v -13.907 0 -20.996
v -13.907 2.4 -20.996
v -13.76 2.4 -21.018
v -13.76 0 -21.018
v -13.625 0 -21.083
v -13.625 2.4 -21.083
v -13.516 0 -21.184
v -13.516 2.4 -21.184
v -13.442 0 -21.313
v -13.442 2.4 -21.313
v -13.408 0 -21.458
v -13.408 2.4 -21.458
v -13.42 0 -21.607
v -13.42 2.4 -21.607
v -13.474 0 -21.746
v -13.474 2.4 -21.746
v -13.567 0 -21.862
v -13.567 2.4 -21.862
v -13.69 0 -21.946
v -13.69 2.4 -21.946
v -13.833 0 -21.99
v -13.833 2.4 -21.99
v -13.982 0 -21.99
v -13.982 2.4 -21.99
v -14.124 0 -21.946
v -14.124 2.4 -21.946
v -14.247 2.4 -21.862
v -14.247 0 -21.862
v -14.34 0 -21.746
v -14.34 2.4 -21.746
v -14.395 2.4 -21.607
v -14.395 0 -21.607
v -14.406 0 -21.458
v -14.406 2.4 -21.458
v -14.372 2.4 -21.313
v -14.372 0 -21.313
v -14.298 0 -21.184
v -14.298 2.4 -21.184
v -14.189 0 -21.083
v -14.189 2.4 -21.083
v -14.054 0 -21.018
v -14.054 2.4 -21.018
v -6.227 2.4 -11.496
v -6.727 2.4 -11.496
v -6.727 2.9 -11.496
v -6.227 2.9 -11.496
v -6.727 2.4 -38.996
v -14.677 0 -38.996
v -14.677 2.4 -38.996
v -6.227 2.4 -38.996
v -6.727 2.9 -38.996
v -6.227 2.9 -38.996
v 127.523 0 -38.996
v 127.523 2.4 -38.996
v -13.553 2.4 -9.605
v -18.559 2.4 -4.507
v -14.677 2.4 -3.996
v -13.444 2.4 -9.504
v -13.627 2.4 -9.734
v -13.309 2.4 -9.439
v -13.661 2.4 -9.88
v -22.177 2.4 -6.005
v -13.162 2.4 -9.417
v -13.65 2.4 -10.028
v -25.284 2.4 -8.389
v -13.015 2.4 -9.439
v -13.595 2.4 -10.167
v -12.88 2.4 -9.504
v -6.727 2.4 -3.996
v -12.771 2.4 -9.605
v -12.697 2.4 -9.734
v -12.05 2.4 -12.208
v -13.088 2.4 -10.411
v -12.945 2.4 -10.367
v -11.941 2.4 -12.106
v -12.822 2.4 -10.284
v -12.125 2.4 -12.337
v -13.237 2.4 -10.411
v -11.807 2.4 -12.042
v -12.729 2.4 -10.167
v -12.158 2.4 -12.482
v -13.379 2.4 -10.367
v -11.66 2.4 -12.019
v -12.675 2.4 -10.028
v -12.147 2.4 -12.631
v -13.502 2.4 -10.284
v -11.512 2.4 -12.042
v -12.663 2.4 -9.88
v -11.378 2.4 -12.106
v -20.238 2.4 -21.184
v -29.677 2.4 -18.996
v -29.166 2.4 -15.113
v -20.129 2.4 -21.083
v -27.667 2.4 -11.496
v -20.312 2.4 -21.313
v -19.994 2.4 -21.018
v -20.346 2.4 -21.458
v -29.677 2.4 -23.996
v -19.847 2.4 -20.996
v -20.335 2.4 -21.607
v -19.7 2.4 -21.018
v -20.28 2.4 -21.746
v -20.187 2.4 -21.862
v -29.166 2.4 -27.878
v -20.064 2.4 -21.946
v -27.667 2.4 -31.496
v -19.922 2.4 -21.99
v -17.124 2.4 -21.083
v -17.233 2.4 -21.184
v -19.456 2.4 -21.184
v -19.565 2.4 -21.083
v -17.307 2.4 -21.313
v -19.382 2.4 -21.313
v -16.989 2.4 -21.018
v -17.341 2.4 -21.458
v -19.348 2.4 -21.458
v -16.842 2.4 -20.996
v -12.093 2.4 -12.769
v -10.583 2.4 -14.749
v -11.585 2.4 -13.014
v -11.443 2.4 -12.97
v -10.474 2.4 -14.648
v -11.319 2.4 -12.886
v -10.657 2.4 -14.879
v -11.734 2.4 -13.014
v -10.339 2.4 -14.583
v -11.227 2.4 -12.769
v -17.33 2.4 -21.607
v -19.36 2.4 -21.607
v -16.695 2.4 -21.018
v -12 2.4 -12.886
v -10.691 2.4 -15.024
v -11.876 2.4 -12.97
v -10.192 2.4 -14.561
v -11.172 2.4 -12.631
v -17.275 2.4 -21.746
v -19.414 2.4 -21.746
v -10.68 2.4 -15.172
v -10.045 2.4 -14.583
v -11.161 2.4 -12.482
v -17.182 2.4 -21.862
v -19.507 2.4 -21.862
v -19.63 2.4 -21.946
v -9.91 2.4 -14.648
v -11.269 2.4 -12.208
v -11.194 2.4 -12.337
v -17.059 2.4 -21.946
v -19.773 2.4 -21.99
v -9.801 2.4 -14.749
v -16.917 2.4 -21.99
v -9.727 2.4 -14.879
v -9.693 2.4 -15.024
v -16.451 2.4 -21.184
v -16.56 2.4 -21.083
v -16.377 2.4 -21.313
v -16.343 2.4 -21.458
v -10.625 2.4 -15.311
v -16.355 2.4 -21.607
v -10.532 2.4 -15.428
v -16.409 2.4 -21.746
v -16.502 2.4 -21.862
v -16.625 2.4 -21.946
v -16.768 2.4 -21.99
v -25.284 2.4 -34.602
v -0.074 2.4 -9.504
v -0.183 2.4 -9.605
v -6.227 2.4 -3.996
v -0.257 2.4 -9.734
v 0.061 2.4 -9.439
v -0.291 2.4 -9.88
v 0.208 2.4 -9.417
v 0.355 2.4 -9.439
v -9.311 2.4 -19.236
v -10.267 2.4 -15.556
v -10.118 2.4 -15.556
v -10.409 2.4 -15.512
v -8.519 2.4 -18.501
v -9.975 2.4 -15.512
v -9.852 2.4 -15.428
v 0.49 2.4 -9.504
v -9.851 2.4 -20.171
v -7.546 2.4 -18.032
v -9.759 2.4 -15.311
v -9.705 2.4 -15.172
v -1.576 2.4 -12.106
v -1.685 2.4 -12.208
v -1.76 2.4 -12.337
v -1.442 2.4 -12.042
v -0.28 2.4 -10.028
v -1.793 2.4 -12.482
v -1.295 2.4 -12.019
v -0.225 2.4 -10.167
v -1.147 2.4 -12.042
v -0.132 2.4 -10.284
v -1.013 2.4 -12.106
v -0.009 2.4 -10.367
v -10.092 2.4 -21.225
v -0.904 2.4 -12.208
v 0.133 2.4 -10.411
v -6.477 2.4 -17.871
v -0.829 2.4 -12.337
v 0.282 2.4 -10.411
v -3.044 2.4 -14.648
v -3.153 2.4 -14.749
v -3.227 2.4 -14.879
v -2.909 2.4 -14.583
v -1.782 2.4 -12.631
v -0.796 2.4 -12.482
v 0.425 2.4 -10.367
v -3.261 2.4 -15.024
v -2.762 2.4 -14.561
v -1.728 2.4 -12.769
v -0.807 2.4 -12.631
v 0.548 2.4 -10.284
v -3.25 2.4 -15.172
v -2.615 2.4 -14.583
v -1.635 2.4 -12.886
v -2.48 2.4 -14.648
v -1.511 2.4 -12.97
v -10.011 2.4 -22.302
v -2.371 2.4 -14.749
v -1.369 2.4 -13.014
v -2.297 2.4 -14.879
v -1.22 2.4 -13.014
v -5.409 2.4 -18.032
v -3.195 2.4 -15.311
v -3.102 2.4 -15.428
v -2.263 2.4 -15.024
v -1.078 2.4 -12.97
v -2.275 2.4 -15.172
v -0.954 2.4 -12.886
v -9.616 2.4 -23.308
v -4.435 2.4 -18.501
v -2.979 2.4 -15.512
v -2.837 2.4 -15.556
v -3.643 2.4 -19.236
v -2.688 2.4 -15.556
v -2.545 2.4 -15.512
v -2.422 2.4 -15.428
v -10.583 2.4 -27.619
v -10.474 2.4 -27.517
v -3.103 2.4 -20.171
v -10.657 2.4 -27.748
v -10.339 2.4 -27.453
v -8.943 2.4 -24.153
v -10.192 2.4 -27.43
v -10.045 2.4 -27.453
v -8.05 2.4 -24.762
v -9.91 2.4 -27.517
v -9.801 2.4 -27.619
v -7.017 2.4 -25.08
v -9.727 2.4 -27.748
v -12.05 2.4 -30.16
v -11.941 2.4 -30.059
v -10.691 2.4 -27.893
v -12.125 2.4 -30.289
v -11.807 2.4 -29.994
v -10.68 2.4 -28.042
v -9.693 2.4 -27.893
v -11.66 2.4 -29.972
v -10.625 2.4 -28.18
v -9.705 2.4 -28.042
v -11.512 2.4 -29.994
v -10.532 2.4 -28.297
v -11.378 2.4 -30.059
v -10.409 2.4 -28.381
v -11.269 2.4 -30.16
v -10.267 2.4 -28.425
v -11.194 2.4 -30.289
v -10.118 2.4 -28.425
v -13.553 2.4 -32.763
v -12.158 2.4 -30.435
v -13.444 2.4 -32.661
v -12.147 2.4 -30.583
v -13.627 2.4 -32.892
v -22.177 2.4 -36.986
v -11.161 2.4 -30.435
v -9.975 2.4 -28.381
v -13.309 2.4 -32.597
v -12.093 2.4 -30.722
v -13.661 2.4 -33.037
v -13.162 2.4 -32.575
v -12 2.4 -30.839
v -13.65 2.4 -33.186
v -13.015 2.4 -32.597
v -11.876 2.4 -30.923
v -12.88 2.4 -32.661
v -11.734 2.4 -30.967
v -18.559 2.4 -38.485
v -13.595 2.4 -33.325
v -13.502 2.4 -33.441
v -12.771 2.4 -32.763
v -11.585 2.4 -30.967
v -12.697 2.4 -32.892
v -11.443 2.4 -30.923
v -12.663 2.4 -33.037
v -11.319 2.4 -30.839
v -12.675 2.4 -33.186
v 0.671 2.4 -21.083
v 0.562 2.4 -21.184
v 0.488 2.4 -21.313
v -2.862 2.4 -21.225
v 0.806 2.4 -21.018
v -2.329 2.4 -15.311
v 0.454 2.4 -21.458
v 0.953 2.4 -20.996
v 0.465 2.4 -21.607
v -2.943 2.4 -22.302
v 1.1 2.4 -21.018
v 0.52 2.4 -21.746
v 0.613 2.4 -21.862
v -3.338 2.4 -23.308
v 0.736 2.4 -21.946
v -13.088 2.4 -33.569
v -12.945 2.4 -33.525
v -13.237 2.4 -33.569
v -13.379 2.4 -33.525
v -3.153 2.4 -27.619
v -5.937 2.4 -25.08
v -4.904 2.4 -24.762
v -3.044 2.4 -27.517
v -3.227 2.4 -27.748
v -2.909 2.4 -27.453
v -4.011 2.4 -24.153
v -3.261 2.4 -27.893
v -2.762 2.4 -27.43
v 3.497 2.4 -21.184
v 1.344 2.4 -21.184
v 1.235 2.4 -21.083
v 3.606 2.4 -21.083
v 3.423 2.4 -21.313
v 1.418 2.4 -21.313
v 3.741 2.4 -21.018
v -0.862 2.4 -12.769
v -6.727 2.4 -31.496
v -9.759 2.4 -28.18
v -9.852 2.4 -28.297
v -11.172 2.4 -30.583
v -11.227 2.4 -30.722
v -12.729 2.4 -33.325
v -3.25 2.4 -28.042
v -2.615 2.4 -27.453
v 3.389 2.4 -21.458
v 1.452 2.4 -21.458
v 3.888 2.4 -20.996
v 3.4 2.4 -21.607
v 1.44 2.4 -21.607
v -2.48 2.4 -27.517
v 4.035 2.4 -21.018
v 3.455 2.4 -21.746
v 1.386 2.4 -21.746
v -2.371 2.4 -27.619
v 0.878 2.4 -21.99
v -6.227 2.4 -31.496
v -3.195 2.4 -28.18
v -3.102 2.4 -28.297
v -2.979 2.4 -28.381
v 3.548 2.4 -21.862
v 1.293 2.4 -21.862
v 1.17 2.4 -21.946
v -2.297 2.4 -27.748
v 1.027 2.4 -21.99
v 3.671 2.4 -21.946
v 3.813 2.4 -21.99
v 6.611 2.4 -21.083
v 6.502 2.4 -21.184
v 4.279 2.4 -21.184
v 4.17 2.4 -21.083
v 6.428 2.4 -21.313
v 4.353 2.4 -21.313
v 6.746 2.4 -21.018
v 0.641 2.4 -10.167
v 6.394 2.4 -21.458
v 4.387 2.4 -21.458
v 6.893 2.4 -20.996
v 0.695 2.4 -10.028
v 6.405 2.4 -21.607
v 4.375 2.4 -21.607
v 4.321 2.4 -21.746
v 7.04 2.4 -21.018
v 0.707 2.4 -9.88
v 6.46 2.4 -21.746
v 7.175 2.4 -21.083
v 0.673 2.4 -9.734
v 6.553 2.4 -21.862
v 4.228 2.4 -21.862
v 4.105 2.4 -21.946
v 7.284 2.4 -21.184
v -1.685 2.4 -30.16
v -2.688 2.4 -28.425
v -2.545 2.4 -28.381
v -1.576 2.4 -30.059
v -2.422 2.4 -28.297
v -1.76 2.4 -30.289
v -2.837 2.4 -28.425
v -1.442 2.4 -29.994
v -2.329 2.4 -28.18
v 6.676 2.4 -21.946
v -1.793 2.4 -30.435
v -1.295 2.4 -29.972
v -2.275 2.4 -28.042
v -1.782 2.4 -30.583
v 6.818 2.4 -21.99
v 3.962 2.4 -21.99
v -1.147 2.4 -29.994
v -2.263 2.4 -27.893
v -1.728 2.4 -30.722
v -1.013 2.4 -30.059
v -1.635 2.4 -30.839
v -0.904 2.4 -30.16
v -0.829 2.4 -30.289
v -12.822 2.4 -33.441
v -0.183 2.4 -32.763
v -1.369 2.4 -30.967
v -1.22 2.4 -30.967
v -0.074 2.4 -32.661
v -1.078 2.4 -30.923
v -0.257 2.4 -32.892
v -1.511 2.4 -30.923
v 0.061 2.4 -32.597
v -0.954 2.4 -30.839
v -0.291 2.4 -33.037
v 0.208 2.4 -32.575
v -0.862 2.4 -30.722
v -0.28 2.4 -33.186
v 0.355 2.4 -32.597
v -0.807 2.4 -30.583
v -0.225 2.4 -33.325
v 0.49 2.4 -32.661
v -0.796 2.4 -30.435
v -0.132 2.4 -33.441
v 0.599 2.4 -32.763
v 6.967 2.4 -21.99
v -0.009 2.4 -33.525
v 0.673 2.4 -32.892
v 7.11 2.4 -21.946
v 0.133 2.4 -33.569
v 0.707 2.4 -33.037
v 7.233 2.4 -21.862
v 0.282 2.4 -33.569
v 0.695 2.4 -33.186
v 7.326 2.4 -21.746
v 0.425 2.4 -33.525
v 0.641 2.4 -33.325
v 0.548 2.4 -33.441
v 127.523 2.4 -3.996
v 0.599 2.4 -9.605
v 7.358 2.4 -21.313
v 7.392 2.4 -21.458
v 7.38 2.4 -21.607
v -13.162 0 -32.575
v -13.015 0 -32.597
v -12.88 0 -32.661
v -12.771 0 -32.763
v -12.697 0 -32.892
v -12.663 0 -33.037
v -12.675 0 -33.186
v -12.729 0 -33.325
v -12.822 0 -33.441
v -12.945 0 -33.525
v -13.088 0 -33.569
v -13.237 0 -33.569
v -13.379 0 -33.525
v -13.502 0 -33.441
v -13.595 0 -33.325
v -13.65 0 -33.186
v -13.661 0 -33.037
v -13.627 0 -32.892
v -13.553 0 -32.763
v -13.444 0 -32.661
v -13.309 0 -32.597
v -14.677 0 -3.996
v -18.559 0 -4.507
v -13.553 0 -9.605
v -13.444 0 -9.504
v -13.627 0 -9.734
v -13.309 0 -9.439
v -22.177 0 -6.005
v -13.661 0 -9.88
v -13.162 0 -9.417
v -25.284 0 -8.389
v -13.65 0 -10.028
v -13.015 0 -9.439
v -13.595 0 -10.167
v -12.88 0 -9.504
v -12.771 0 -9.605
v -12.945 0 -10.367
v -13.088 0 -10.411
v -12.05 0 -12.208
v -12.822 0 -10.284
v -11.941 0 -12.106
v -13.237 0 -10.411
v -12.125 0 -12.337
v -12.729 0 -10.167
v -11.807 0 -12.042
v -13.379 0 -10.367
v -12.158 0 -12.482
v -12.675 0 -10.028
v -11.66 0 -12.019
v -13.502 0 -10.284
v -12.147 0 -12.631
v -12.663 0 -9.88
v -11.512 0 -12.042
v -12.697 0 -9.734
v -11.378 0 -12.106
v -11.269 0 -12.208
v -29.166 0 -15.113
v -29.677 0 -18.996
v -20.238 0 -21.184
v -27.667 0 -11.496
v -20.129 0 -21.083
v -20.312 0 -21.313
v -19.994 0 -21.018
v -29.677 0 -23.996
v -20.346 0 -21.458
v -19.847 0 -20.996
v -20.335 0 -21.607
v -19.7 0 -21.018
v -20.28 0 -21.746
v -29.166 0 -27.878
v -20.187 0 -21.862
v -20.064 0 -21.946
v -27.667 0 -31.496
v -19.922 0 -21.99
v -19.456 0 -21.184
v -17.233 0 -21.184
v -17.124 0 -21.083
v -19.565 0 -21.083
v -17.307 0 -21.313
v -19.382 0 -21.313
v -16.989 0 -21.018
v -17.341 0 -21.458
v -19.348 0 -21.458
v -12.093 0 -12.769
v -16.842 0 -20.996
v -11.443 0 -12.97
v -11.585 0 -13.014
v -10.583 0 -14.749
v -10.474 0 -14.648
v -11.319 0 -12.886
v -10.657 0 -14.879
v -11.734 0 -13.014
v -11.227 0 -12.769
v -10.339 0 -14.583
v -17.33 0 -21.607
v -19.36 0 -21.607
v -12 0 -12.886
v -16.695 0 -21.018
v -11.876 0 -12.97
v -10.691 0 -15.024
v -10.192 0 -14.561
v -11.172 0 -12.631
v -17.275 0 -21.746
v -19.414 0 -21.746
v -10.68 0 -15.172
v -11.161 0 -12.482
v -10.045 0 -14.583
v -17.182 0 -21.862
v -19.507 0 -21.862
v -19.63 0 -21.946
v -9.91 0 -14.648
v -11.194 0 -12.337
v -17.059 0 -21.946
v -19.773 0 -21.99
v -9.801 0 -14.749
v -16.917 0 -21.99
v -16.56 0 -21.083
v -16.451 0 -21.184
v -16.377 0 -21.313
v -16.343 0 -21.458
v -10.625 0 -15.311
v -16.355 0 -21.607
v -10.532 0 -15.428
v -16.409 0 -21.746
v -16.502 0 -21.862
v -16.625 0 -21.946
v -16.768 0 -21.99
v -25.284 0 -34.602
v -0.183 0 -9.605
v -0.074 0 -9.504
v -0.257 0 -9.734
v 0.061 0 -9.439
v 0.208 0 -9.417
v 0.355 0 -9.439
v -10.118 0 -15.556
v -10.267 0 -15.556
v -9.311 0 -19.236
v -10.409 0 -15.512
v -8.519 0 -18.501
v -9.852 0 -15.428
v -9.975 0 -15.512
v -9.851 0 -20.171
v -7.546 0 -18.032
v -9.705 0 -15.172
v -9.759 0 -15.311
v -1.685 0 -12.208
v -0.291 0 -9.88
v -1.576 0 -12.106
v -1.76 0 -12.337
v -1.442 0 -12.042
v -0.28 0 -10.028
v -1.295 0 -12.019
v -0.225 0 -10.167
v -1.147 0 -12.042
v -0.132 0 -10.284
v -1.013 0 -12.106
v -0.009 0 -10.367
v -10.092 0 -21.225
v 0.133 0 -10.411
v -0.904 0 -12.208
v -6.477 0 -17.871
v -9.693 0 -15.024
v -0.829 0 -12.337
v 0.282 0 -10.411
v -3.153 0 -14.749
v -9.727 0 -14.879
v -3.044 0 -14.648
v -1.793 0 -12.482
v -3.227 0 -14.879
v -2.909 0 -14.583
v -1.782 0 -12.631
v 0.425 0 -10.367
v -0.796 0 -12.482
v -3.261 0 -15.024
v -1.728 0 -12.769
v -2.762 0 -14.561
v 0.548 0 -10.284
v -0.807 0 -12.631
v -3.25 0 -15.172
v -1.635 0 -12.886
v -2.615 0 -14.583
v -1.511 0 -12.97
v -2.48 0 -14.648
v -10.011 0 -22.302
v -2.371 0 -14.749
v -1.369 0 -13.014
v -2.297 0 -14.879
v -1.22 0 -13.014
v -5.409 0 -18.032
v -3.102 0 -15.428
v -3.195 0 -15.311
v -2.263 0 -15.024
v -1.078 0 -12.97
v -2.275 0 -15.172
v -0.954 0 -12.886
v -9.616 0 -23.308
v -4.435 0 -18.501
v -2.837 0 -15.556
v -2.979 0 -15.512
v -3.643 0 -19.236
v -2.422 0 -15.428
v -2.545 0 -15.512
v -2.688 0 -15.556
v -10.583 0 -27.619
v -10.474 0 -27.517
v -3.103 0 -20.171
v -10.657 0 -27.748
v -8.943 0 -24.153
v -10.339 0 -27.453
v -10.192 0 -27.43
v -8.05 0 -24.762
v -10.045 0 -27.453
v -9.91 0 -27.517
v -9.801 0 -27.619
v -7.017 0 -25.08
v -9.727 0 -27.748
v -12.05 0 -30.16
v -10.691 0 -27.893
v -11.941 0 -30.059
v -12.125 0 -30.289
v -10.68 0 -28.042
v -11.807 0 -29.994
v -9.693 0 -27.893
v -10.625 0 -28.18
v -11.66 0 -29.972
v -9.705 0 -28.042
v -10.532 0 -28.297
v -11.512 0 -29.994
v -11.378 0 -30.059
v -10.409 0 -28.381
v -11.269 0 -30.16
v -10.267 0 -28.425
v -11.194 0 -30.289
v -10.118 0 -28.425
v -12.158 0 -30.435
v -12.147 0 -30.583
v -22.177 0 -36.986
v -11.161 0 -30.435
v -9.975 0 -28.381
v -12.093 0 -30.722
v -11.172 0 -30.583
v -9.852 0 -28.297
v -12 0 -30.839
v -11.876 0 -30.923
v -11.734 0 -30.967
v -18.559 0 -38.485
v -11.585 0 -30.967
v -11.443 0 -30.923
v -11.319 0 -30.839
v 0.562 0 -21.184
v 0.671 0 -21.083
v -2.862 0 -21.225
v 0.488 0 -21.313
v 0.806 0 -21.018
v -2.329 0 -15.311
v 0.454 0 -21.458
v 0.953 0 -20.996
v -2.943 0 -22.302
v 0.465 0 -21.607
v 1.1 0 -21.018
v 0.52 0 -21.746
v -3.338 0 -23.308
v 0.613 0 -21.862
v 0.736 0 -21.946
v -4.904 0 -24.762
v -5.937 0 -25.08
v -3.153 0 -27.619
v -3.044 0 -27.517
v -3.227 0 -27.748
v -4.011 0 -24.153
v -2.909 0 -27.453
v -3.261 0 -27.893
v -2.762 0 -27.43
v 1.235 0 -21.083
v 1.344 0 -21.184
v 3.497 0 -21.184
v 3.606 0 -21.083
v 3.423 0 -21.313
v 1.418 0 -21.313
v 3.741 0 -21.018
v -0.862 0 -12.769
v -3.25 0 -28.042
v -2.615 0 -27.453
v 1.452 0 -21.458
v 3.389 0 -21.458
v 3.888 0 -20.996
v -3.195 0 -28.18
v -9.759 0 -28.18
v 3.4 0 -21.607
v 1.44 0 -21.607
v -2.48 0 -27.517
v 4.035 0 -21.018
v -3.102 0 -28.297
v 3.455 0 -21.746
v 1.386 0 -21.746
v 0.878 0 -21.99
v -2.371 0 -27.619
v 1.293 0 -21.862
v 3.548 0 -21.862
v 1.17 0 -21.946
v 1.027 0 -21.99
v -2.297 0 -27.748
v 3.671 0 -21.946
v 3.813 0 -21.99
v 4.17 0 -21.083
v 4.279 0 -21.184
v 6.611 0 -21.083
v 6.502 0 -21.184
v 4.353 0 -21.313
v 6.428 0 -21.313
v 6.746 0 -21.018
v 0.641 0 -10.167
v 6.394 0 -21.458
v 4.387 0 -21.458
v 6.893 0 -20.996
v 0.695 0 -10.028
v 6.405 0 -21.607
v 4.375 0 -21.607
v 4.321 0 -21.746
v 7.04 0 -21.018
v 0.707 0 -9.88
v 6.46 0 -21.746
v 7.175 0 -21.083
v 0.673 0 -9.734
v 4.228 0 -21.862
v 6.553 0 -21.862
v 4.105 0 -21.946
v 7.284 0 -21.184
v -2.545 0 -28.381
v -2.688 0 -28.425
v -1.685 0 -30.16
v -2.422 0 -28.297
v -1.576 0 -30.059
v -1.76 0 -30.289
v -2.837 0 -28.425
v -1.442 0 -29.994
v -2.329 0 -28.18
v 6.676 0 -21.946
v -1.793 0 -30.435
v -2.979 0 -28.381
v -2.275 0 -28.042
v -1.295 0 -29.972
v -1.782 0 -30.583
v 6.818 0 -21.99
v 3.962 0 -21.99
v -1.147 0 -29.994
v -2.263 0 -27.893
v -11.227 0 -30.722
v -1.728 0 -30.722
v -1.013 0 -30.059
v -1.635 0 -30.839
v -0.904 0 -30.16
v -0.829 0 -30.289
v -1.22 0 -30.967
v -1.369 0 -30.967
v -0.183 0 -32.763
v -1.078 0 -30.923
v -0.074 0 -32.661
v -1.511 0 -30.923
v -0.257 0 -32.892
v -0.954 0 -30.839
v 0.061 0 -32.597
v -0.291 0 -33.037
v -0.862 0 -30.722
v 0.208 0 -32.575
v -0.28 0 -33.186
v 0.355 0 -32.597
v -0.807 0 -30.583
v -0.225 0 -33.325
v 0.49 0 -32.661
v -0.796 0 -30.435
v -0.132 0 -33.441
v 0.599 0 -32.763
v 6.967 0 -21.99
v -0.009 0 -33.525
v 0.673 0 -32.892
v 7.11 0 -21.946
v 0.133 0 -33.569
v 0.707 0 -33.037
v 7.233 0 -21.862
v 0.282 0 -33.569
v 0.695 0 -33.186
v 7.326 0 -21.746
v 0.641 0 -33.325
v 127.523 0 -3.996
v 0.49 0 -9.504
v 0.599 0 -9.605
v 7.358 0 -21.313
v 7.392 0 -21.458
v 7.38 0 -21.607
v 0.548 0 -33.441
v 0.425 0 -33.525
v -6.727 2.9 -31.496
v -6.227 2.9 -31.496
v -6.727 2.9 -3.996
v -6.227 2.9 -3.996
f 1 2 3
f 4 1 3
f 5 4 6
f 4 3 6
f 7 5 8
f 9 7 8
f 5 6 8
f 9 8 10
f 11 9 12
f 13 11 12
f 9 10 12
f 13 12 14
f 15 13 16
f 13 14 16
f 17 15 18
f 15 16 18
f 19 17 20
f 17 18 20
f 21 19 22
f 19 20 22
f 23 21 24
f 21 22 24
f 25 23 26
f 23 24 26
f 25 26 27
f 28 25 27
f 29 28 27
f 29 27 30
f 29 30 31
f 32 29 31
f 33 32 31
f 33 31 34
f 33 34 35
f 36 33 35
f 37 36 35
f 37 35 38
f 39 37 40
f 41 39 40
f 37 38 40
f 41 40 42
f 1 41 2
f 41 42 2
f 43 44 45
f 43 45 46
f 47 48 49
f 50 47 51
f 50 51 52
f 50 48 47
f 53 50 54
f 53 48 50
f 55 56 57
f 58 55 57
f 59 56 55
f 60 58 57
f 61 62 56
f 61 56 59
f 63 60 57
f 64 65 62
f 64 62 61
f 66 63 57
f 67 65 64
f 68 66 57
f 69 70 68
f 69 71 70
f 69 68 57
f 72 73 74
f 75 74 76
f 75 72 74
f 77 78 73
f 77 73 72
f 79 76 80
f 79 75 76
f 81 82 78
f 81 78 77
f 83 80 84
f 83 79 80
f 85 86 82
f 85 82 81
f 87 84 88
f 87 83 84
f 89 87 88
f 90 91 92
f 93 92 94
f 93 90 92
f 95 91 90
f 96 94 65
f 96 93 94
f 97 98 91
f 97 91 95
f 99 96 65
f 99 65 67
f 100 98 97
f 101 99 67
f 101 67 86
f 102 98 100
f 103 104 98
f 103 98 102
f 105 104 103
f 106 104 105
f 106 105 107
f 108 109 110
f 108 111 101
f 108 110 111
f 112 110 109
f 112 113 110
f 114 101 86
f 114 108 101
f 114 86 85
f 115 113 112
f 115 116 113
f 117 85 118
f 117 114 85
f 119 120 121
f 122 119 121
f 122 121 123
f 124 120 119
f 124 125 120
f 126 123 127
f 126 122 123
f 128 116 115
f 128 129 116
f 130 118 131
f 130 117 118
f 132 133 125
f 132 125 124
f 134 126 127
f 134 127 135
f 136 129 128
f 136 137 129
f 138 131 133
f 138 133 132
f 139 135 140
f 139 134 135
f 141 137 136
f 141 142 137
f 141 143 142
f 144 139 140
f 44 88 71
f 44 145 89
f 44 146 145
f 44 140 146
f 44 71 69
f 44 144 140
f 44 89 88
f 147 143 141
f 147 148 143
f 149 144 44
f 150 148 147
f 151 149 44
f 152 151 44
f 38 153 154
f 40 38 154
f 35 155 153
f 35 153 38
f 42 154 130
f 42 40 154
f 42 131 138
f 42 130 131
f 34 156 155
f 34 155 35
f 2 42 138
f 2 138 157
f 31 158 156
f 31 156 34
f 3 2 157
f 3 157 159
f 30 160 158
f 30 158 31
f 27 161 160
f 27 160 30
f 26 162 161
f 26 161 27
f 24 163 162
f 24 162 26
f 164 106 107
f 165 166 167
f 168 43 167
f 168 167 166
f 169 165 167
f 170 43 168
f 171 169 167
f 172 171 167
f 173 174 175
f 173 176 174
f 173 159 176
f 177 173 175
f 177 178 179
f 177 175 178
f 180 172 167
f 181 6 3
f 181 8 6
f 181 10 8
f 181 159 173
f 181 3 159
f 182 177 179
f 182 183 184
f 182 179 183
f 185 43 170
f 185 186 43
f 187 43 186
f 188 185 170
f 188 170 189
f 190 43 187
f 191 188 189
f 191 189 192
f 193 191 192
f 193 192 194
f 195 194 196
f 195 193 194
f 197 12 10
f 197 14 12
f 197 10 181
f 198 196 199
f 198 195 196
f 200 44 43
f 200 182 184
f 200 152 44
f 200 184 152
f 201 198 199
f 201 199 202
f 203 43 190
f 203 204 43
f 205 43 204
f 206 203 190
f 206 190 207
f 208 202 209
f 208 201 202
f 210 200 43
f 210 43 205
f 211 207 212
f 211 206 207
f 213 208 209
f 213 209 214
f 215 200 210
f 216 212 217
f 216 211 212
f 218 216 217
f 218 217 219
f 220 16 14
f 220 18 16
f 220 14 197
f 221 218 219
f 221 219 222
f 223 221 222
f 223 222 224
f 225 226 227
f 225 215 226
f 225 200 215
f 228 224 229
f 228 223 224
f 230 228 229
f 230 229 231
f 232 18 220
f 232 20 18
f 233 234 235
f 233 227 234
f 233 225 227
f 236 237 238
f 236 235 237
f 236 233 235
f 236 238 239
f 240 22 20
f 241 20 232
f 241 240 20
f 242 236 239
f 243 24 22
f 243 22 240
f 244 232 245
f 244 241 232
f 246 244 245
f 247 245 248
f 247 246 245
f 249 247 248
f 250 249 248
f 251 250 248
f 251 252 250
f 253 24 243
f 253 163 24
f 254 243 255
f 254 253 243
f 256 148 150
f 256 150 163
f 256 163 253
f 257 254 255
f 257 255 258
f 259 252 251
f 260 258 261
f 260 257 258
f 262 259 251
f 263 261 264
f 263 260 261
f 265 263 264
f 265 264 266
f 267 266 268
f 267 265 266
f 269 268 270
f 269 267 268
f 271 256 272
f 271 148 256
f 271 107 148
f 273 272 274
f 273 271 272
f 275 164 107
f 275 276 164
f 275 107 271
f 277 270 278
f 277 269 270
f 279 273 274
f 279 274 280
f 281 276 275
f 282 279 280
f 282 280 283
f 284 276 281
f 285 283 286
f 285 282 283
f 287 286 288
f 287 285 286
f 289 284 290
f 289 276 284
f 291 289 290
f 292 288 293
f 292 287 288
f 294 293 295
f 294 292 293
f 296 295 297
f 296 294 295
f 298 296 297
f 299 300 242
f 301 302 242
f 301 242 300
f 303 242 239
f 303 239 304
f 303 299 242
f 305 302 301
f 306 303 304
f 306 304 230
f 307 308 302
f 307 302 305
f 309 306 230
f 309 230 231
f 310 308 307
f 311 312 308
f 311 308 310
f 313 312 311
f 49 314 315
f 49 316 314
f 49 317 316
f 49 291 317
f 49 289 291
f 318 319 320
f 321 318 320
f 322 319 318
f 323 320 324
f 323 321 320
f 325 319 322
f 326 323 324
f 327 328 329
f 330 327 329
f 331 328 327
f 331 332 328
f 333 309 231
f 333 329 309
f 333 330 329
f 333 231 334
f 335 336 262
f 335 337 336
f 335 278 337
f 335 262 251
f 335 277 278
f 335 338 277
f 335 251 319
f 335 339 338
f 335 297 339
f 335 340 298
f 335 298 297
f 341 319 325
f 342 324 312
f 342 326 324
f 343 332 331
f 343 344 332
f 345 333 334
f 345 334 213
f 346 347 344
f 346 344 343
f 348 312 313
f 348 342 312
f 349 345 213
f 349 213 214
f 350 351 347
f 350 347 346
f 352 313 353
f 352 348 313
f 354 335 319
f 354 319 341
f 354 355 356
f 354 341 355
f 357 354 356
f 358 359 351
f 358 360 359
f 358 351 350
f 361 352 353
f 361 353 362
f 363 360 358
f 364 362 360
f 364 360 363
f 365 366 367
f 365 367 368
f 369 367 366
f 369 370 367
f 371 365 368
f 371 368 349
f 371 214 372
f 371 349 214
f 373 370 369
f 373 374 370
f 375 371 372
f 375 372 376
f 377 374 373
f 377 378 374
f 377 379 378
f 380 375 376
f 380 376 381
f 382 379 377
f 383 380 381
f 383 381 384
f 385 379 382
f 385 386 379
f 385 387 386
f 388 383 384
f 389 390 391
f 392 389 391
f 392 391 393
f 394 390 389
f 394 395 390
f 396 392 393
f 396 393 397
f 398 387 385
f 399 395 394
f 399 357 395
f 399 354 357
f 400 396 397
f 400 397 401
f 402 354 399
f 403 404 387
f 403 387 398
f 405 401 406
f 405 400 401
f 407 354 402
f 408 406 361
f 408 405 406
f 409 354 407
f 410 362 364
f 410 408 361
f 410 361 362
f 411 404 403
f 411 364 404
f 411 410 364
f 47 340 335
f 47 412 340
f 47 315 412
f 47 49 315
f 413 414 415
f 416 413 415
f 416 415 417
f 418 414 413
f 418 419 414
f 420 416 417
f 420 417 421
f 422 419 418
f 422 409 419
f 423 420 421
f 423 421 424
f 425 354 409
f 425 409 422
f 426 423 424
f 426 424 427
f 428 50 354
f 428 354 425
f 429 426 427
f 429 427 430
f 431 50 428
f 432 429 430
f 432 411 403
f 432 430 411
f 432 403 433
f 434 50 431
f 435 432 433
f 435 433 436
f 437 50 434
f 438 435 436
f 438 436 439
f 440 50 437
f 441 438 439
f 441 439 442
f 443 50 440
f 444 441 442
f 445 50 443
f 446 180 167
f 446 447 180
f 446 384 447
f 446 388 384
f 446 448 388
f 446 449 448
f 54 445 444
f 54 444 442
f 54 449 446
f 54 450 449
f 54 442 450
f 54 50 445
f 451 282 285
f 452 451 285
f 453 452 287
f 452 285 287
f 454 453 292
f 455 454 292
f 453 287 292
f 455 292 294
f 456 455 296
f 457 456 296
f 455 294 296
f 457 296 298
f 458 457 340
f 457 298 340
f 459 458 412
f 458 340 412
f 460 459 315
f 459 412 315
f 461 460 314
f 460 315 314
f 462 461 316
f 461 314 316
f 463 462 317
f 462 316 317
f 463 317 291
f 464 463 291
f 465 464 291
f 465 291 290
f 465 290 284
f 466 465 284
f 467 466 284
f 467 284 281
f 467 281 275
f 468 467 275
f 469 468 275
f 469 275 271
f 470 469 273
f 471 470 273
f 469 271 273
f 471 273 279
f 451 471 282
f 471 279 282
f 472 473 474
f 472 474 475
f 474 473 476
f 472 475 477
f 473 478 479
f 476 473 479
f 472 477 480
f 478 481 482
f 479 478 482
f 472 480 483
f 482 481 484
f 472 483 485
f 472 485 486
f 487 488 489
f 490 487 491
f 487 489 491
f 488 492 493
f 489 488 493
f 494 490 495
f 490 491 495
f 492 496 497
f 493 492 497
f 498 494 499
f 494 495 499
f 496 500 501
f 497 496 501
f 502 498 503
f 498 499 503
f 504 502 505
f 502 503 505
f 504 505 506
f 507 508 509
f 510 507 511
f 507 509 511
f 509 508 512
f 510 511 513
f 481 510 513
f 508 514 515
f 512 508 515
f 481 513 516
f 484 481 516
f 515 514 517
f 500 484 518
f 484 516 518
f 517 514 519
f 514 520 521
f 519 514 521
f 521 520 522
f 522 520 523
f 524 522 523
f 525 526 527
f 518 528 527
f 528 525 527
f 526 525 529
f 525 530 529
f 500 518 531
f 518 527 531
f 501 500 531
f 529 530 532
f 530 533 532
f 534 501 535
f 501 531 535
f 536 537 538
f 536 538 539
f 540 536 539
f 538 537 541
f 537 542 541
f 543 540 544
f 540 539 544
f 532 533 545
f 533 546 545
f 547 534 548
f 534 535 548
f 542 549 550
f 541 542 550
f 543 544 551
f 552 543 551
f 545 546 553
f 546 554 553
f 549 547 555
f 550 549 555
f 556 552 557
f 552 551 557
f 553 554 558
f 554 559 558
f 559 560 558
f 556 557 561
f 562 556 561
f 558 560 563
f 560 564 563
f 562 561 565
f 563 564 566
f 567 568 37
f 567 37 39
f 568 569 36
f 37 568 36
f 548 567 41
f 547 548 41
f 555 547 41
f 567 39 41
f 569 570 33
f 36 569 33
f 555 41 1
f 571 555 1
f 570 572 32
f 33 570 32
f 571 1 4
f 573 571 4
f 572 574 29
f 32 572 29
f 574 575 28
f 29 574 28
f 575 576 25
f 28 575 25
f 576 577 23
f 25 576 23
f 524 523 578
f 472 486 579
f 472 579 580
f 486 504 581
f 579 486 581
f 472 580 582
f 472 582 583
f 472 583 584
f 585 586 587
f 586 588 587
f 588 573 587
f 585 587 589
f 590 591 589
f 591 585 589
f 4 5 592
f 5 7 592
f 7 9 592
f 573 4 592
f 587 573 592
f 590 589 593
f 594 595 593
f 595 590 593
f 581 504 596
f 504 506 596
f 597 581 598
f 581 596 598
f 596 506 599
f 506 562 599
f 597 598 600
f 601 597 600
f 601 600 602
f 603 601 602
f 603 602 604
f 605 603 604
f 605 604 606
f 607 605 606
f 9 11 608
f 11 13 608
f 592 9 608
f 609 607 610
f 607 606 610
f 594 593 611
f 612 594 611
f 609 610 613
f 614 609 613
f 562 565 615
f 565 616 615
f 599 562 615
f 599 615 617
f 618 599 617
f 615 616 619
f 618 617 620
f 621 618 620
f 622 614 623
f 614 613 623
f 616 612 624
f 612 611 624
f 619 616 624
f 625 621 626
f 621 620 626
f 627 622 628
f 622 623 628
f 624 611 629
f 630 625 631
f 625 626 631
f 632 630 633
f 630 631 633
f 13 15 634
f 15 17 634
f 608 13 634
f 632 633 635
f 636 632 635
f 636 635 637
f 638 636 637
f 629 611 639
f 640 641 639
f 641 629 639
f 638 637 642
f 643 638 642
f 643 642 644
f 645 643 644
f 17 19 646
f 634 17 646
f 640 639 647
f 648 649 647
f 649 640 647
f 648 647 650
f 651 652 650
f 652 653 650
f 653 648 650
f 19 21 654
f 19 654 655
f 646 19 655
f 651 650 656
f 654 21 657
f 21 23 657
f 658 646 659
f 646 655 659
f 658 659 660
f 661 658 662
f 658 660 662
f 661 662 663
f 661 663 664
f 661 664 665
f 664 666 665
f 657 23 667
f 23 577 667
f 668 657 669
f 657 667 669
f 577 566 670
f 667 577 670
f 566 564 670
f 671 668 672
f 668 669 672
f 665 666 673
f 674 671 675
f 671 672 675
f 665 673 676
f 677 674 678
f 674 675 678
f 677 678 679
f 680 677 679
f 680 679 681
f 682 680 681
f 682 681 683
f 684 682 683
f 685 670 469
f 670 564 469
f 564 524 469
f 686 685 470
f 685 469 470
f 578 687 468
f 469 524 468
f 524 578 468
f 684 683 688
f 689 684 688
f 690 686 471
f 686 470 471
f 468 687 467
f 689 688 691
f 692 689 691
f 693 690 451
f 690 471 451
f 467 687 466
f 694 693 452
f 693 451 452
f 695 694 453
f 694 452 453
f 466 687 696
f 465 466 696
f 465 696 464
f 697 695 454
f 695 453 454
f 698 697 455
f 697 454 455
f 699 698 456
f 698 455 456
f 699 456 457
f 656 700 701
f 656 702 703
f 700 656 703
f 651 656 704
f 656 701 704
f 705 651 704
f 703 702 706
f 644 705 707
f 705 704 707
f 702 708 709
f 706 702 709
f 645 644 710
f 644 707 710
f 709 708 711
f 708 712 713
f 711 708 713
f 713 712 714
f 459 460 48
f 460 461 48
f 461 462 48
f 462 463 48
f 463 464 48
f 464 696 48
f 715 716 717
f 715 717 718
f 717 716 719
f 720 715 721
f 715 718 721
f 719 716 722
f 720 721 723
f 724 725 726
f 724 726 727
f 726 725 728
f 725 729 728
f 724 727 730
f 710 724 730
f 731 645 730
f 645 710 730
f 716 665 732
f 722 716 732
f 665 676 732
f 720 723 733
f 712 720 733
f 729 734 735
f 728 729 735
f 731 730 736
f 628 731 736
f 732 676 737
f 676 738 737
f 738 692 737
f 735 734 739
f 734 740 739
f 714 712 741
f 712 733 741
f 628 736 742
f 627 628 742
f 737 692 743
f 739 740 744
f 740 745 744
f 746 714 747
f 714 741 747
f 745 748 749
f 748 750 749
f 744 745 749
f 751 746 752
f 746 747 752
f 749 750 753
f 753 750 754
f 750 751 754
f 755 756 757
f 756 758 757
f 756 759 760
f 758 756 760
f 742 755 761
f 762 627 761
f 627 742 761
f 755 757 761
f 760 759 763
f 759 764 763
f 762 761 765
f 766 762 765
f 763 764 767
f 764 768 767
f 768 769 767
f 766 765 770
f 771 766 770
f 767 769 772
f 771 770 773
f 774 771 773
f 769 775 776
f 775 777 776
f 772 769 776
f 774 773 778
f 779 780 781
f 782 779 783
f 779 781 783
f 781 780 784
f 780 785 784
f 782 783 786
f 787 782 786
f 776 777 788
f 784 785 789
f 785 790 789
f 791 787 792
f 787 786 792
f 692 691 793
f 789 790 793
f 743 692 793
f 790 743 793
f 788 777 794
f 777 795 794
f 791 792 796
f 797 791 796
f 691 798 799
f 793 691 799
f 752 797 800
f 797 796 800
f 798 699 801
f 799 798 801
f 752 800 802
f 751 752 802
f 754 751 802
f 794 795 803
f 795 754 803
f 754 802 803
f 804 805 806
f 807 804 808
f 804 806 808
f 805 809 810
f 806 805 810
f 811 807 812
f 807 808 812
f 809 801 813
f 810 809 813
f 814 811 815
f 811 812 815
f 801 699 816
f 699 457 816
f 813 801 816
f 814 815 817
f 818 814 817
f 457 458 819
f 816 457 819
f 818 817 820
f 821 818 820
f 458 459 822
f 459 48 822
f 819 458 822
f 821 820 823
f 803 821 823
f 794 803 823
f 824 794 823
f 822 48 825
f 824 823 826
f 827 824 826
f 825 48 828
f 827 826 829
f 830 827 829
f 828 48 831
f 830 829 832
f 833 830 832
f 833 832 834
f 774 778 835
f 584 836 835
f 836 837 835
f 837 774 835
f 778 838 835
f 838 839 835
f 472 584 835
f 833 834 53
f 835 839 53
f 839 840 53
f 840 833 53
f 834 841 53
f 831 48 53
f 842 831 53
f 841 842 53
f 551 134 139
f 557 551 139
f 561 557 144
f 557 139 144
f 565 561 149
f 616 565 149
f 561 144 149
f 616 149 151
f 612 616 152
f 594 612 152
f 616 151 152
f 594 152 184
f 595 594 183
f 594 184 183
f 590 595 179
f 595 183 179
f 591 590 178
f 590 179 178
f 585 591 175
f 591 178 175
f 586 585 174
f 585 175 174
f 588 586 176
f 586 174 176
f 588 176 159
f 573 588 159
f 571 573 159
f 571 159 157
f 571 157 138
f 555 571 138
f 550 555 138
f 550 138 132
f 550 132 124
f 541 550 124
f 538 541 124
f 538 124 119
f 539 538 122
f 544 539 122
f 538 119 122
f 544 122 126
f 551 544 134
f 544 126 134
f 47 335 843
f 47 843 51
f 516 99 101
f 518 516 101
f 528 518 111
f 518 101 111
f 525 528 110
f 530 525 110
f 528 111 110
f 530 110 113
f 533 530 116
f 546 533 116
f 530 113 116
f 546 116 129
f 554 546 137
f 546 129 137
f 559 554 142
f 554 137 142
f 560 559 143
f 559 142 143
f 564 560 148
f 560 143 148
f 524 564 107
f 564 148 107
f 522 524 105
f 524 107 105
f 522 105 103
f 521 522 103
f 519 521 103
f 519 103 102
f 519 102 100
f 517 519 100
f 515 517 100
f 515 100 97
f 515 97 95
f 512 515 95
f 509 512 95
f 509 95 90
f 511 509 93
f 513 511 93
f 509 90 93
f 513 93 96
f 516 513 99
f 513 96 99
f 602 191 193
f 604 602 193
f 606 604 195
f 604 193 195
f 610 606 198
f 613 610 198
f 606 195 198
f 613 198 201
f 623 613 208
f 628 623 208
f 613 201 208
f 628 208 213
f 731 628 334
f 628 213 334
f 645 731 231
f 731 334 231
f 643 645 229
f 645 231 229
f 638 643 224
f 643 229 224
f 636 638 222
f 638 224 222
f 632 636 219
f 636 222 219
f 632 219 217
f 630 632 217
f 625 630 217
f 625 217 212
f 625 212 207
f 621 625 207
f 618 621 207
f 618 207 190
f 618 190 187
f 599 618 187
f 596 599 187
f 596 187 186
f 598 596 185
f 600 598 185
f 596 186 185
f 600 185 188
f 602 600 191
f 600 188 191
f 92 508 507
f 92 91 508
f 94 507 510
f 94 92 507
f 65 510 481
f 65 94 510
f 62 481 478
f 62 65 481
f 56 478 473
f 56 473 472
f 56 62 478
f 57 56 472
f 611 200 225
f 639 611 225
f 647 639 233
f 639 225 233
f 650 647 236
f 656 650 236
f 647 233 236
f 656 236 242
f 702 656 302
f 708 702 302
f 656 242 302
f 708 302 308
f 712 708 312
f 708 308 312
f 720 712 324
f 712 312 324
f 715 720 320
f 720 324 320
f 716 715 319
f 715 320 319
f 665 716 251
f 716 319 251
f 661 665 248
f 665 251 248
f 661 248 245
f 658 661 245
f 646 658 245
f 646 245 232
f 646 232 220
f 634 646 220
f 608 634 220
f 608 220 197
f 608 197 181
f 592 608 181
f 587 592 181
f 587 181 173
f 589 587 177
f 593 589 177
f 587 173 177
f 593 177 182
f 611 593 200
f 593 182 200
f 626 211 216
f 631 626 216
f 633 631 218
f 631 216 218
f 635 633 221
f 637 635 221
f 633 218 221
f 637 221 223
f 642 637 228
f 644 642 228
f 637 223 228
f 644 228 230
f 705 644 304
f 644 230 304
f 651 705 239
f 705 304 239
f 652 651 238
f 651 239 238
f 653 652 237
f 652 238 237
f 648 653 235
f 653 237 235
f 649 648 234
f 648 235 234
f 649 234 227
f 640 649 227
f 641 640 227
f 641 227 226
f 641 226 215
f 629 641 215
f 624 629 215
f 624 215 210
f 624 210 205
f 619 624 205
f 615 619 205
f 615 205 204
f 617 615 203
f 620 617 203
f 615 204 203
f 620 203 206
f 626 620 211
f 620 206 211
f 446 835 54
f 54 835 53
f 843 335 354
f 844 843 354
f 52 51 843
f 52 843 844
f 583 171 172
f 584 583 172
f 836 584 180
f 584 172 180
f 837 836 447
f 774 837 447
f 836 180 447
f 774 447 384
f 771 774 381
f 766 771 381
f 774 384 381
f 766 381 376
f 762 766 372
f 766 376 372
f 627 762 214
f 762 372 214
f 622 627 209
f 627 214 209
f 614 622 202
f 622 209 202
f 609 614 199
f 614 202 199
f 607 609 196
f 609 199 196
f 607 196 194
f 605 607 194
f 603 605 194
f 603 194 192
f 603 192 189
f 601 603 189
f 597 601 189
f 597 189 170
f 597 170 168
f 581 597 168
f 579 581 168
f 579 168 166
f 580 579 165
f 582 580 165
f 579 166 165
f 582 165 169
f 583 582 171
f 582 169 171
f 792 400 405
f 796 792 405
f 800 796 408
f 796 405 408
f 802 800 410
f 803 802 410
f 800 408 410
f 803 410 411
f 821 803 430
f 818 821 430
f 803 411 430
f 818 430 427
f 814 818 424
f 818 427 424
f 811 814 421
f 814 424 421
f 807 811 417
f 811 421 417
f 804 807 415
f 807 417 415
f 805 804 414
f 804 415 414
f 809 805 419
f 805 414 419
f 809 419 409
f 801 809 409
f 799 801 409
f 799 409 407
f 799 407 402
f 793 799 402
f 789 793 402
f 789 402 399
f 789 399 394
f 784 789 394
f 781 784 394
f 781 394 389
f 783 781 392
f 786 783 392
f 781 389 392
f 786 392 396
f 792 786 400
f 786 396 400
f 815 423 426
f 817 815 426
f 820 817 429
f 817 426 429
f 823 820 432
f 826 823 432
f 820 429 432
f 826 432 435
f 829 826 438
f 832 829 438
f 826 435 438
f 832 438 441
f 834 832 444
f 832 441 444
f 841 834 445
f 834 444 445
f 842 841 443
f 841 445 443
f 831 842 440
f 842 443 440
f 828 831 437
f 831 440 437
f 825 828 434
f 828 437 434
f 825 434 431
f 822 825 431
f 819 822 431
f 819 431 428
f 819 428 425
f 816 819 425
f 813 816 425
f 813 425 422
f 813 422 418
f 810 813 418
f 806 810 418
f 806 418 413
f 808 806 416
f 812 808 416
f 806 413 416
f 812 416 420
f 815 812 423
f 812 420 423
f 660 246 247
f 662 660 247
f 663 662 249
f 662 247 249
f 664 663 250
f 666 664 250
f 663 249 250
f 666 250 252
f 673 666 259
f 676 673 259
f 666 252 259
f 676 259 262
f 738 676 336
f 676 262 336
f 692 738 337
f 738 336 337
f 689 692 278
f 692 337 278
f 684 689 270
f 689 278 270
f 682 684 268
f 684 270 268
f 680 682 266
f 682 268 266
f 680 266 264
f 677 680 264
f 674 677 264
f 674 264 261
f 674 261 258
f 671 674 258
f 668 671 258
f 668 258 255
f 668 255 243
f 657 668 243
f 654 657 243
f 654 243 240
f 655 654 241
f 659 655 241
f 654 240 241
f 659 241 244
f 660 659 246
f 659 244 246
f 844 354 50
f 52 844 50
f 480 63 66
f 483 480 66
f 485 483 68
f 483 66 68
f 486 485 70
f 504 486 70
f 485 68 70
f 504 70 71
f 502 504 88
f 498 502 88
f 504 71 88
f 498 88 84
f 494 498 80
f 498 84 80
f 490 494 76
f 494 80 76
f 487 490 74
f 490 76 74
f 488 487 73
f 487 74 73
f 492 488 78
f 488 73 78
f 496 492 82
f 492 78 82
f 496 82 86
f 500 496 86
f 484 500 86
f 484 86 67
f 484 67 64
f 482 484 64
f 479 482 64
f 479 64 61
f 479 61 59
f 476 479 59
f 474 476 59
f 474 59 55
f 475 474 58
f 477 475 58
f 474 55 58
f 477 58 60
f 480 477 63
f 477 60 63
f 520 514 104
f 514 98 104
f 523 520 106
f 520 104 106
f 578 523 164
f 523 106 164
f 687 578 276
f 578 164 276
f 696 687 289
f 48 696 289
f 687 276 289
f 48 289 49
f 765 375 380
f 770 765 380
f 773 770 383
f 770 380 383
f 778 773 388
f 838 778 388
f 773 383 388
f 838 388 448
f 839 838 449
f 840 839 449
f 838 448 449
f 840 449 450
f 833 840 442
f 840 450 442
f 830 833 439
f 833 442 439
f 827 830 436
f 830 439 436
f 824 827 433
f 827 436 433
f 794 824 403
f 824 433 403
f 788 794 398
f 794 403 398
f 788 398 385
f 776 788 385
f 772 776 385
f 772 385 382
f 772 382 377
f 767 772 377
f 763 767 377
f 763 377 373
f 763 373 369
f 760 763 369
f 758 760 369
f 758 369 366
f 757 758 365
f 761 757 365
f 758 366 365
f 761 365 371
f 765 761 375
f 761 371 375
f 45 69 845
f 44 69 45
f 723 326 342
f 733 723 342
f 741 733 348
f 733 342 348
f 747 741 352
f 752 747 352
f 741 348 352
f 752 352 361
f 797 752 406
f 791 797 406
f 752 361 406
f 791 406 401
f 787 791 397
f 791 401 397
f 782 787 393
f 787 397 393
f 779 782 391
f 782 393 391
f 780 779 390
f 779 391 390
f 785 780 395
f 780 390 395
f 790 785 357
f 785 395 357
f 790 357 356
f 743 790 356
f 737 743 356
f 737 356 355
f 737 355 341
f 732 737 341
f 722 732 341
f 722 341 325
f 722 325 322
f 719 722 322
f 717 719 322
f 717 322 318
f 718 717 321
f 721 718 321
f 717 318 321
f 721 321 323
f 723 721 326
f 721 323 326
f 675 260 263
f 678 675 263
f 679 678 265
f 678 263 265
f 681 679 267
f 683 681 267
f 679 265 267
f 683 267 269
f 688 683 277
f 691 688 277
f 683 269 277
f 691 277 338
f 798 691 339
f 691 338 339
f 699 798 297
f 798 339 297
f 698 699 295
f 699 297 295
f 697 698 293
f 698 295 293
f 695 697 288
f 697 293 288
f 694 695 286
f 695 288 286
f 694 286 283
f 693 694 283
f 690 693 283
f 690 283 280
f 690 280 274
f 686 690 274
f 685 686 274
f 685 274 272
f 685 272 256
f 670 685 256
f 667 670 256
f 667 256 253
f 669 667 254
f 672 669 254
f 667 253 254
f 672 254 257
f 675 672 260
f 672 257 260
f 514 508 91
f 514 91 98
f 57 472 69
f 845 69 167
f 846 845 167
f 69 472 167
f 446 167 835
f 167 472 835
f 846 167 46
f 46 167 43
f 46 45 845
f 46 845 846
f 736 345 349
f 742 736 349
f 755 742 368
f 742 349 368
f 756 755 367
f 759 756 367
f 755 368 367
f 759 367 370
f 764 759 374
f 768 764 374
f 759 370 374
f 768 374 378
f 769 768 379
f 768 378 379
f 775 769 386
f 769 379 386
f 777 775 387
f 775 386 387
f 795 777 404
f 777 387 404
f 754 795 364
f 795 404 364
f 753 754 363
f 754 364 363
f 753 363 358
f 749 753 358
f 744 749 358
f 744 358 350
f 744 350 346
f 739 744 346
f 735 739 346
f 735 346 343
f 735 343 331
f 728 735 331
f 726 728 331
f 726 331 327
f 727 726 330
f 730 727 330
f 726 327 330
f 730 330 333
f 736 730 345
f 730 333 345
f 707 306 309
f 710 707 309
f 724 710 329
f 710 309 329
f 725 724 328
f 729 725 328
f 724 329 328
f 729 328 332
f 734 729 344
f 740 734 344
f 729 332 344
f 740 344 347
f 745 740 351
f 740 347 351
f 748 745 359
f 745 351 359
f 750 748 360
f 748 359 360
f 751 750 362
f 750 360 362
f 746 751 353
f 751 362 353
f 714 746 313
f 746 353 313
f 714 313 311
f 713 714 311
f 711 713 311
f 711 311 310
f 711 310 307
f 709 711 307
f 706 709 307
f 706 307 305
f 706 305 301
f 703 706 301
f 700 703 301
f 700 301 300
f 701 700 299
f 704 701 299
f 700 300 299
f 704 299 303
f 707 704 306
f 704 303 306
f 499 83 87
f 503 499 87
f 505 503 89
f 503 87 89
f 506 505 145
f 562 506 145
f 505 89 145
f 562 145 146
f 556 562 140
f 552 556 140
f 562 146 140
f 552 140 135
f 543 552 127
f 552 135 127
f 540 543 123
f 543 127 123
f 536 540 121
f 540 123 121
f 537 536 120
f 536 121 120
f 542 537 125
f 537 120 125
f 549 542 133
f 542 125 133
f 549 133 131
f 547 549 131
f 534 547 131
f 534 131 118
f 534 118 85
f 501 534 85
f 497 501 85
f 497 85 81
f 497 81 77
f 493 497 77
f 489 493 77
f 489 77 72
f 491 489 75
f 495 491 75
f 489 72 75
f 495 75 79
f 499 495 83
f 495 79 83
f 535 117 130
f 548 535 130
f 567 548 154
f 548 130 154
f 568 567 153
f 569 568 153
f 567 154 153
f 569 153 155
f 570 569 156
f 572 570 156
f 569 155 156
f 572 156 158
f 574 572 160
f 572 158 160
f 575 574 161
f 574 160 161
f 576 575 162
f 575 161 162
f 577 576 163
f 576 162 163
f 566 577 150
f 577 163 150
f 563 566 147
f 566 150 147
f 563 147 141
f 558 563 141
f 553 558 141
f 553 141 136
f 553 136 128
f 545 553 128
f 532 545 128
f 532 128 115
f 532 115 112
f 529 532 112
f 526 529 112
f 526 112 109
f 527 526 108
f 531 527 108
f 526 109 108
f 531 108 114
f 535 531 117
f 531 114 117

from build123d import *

# Parameters (mm, degrees)
SKETCH1_W           = 157.2
SKETCH1_H           = 35
BOSS_EXTRUDE1_DEPTH = 2.4
SKETCH2_R           = 3.625
SKETCH2_R_2         = 0.5
CUT_EXTRUDE1_DEPTH  = 2.4
SKETCH6_W           = 0.5
SKETCH6_H           = 7.5
BOSS_EXTRUDE3_DEPTH = 0.5
FILLET3_R           = 15


with BuildPart() as part:
    # Sketch1 → Boss-Extrude1 (new body)
    with BuildSketch(Plane(origin=(0, 0, 0), x_dir=(1, 0, 0), z_dir=(0, 1, 0))):
        with Locations((48.922946176, 21.495750708)):
            Rectangle(SKETCH1_W, SKETCH1_H)
    extrude(amount=BOSS_EXTRUDE1_DEPTH)

    # Sketch2 → Cut-Extrude1 (cut)
    with BuildSketch(Plane(origin=(0, 2.4, 0), x_dir=(1, 0, 0), z_dir=(0, 1, 0))):
        with Locations(Location((-6.477053824, 21.495750708, 0), (0, 0, 270))):
            Circle(SKETCH2_R)
        with Locations(Location((-13.907053824, 21.495750708, 0), (0, 0, 270))):
            Circle(SKETCH2_R_2)
        with Locations(Location((-16.842053824, 21.495750708, 0), (0, 0, 270))):
            Circle(SKETCH2_R_2)
        with Locations(Location((-19.847053824, 21.495750708, 0), (0, 0, 270))):
            Circle(SKETCH2_R_2)
        with Locations(Location((-10.192053824, 27.930319458, 0), (0, 0, 270))):
            Circle(SKETCH2_R_2)
        with Locations(Location((-11.659553824, 30.472104018, 0), (0, 0, 270))):
            Circle(SKETCH2_R_2)
        with Locations(Location((-13.162053824, 33.074510357, 0), (0, 0, 270))):
            Circle(SKETCH2_R_2)
        with Locations(Location((-2.762053824, 27.930319458, 0), (0, 0, 270))):
            Circle(SKETCH2_R_2)
        with Locations(Location((-1.294553824, 30.472104018, 0), (0, 0, 270))):
            Circle(SKETCH2_R_2)
        with Locations(Location((0.207946176, 33.074510357, 0), (0, 0, 270))):
            Circle(SKETCH2_R_2)
        with Locations(Location((0.952946176, 21.495750708, 0), (0, 0, 270))):
            Circle(SKETCH2_R_2)
        with Locations(Location((3.887946176, 21.495750708, 0), (0, 0, 270))):
            Circle(SKETCH2_R_2)
        with Locations(Location((6.892946176, 21.495750708, 0), (0, 0, 270))):
            Circle(SKETCH2_R_2)
        with Locations(Location((-2.762053824, 15.061181958, 0), (0, 0, 270))):
            Circle(SKETCH2_R_2)
        with Locations(Location((-1.294553824, 12.519397398, 0), (0, 0, 270))):
            Circle(SKETCH2_R_2)
        with Locations(Location((0.207946176, 9.91699106, 0), (0, 0, 270))):
            Circle(SKETCH2_R_2)
        with Locations(Location((-10.192053824, 15.061181958, 0), (0, 0, 270))):
            Circle(SKETCH2_R_2)
        with Locations(Location((-11.659553824, 12.519397398, 0), (0, 0, 270))):
            Circle(SKETCH2_R_2)
        with Locations(Location((-13.162053824, 9.91699106, 0), (0, 0, 270))):
            Circle(SKETCH2_R_2)
    extrude(amount=-CUT_EXTRUDE1_DEPTH, mode=Mode.SUBTRACT)

    # Sketch6 → Boss-Extrude3 (add)
    with BuildSketch(Plane(origin=(0, 2.4, 0), x_dir=(1, 0, 0), z_dir=(0, 1, 0))):
        with Locations((-6.477053824, 7.745750708)):
            Rectangle(SKETCH6_W, SKETCH6_H)
        with Locations((-6.477053824, 35.245750708)):
            Rectangle(SKETCH6_W, SKETCH6_H)
    extrude(amount=BOSS_EXTRUDE3_DEPTH)

    # Fillet3
    fillet3_edges = [part.edges().sort_by_distance(p)[0] for p in [
        (-29.677053824, 1.2, -38.995750708),
        (-29.677053824, 1.2, -3.995750708),
    ]]
    fillet(fillet3_edges, radius=FILLET3_R)


solid = part.part
